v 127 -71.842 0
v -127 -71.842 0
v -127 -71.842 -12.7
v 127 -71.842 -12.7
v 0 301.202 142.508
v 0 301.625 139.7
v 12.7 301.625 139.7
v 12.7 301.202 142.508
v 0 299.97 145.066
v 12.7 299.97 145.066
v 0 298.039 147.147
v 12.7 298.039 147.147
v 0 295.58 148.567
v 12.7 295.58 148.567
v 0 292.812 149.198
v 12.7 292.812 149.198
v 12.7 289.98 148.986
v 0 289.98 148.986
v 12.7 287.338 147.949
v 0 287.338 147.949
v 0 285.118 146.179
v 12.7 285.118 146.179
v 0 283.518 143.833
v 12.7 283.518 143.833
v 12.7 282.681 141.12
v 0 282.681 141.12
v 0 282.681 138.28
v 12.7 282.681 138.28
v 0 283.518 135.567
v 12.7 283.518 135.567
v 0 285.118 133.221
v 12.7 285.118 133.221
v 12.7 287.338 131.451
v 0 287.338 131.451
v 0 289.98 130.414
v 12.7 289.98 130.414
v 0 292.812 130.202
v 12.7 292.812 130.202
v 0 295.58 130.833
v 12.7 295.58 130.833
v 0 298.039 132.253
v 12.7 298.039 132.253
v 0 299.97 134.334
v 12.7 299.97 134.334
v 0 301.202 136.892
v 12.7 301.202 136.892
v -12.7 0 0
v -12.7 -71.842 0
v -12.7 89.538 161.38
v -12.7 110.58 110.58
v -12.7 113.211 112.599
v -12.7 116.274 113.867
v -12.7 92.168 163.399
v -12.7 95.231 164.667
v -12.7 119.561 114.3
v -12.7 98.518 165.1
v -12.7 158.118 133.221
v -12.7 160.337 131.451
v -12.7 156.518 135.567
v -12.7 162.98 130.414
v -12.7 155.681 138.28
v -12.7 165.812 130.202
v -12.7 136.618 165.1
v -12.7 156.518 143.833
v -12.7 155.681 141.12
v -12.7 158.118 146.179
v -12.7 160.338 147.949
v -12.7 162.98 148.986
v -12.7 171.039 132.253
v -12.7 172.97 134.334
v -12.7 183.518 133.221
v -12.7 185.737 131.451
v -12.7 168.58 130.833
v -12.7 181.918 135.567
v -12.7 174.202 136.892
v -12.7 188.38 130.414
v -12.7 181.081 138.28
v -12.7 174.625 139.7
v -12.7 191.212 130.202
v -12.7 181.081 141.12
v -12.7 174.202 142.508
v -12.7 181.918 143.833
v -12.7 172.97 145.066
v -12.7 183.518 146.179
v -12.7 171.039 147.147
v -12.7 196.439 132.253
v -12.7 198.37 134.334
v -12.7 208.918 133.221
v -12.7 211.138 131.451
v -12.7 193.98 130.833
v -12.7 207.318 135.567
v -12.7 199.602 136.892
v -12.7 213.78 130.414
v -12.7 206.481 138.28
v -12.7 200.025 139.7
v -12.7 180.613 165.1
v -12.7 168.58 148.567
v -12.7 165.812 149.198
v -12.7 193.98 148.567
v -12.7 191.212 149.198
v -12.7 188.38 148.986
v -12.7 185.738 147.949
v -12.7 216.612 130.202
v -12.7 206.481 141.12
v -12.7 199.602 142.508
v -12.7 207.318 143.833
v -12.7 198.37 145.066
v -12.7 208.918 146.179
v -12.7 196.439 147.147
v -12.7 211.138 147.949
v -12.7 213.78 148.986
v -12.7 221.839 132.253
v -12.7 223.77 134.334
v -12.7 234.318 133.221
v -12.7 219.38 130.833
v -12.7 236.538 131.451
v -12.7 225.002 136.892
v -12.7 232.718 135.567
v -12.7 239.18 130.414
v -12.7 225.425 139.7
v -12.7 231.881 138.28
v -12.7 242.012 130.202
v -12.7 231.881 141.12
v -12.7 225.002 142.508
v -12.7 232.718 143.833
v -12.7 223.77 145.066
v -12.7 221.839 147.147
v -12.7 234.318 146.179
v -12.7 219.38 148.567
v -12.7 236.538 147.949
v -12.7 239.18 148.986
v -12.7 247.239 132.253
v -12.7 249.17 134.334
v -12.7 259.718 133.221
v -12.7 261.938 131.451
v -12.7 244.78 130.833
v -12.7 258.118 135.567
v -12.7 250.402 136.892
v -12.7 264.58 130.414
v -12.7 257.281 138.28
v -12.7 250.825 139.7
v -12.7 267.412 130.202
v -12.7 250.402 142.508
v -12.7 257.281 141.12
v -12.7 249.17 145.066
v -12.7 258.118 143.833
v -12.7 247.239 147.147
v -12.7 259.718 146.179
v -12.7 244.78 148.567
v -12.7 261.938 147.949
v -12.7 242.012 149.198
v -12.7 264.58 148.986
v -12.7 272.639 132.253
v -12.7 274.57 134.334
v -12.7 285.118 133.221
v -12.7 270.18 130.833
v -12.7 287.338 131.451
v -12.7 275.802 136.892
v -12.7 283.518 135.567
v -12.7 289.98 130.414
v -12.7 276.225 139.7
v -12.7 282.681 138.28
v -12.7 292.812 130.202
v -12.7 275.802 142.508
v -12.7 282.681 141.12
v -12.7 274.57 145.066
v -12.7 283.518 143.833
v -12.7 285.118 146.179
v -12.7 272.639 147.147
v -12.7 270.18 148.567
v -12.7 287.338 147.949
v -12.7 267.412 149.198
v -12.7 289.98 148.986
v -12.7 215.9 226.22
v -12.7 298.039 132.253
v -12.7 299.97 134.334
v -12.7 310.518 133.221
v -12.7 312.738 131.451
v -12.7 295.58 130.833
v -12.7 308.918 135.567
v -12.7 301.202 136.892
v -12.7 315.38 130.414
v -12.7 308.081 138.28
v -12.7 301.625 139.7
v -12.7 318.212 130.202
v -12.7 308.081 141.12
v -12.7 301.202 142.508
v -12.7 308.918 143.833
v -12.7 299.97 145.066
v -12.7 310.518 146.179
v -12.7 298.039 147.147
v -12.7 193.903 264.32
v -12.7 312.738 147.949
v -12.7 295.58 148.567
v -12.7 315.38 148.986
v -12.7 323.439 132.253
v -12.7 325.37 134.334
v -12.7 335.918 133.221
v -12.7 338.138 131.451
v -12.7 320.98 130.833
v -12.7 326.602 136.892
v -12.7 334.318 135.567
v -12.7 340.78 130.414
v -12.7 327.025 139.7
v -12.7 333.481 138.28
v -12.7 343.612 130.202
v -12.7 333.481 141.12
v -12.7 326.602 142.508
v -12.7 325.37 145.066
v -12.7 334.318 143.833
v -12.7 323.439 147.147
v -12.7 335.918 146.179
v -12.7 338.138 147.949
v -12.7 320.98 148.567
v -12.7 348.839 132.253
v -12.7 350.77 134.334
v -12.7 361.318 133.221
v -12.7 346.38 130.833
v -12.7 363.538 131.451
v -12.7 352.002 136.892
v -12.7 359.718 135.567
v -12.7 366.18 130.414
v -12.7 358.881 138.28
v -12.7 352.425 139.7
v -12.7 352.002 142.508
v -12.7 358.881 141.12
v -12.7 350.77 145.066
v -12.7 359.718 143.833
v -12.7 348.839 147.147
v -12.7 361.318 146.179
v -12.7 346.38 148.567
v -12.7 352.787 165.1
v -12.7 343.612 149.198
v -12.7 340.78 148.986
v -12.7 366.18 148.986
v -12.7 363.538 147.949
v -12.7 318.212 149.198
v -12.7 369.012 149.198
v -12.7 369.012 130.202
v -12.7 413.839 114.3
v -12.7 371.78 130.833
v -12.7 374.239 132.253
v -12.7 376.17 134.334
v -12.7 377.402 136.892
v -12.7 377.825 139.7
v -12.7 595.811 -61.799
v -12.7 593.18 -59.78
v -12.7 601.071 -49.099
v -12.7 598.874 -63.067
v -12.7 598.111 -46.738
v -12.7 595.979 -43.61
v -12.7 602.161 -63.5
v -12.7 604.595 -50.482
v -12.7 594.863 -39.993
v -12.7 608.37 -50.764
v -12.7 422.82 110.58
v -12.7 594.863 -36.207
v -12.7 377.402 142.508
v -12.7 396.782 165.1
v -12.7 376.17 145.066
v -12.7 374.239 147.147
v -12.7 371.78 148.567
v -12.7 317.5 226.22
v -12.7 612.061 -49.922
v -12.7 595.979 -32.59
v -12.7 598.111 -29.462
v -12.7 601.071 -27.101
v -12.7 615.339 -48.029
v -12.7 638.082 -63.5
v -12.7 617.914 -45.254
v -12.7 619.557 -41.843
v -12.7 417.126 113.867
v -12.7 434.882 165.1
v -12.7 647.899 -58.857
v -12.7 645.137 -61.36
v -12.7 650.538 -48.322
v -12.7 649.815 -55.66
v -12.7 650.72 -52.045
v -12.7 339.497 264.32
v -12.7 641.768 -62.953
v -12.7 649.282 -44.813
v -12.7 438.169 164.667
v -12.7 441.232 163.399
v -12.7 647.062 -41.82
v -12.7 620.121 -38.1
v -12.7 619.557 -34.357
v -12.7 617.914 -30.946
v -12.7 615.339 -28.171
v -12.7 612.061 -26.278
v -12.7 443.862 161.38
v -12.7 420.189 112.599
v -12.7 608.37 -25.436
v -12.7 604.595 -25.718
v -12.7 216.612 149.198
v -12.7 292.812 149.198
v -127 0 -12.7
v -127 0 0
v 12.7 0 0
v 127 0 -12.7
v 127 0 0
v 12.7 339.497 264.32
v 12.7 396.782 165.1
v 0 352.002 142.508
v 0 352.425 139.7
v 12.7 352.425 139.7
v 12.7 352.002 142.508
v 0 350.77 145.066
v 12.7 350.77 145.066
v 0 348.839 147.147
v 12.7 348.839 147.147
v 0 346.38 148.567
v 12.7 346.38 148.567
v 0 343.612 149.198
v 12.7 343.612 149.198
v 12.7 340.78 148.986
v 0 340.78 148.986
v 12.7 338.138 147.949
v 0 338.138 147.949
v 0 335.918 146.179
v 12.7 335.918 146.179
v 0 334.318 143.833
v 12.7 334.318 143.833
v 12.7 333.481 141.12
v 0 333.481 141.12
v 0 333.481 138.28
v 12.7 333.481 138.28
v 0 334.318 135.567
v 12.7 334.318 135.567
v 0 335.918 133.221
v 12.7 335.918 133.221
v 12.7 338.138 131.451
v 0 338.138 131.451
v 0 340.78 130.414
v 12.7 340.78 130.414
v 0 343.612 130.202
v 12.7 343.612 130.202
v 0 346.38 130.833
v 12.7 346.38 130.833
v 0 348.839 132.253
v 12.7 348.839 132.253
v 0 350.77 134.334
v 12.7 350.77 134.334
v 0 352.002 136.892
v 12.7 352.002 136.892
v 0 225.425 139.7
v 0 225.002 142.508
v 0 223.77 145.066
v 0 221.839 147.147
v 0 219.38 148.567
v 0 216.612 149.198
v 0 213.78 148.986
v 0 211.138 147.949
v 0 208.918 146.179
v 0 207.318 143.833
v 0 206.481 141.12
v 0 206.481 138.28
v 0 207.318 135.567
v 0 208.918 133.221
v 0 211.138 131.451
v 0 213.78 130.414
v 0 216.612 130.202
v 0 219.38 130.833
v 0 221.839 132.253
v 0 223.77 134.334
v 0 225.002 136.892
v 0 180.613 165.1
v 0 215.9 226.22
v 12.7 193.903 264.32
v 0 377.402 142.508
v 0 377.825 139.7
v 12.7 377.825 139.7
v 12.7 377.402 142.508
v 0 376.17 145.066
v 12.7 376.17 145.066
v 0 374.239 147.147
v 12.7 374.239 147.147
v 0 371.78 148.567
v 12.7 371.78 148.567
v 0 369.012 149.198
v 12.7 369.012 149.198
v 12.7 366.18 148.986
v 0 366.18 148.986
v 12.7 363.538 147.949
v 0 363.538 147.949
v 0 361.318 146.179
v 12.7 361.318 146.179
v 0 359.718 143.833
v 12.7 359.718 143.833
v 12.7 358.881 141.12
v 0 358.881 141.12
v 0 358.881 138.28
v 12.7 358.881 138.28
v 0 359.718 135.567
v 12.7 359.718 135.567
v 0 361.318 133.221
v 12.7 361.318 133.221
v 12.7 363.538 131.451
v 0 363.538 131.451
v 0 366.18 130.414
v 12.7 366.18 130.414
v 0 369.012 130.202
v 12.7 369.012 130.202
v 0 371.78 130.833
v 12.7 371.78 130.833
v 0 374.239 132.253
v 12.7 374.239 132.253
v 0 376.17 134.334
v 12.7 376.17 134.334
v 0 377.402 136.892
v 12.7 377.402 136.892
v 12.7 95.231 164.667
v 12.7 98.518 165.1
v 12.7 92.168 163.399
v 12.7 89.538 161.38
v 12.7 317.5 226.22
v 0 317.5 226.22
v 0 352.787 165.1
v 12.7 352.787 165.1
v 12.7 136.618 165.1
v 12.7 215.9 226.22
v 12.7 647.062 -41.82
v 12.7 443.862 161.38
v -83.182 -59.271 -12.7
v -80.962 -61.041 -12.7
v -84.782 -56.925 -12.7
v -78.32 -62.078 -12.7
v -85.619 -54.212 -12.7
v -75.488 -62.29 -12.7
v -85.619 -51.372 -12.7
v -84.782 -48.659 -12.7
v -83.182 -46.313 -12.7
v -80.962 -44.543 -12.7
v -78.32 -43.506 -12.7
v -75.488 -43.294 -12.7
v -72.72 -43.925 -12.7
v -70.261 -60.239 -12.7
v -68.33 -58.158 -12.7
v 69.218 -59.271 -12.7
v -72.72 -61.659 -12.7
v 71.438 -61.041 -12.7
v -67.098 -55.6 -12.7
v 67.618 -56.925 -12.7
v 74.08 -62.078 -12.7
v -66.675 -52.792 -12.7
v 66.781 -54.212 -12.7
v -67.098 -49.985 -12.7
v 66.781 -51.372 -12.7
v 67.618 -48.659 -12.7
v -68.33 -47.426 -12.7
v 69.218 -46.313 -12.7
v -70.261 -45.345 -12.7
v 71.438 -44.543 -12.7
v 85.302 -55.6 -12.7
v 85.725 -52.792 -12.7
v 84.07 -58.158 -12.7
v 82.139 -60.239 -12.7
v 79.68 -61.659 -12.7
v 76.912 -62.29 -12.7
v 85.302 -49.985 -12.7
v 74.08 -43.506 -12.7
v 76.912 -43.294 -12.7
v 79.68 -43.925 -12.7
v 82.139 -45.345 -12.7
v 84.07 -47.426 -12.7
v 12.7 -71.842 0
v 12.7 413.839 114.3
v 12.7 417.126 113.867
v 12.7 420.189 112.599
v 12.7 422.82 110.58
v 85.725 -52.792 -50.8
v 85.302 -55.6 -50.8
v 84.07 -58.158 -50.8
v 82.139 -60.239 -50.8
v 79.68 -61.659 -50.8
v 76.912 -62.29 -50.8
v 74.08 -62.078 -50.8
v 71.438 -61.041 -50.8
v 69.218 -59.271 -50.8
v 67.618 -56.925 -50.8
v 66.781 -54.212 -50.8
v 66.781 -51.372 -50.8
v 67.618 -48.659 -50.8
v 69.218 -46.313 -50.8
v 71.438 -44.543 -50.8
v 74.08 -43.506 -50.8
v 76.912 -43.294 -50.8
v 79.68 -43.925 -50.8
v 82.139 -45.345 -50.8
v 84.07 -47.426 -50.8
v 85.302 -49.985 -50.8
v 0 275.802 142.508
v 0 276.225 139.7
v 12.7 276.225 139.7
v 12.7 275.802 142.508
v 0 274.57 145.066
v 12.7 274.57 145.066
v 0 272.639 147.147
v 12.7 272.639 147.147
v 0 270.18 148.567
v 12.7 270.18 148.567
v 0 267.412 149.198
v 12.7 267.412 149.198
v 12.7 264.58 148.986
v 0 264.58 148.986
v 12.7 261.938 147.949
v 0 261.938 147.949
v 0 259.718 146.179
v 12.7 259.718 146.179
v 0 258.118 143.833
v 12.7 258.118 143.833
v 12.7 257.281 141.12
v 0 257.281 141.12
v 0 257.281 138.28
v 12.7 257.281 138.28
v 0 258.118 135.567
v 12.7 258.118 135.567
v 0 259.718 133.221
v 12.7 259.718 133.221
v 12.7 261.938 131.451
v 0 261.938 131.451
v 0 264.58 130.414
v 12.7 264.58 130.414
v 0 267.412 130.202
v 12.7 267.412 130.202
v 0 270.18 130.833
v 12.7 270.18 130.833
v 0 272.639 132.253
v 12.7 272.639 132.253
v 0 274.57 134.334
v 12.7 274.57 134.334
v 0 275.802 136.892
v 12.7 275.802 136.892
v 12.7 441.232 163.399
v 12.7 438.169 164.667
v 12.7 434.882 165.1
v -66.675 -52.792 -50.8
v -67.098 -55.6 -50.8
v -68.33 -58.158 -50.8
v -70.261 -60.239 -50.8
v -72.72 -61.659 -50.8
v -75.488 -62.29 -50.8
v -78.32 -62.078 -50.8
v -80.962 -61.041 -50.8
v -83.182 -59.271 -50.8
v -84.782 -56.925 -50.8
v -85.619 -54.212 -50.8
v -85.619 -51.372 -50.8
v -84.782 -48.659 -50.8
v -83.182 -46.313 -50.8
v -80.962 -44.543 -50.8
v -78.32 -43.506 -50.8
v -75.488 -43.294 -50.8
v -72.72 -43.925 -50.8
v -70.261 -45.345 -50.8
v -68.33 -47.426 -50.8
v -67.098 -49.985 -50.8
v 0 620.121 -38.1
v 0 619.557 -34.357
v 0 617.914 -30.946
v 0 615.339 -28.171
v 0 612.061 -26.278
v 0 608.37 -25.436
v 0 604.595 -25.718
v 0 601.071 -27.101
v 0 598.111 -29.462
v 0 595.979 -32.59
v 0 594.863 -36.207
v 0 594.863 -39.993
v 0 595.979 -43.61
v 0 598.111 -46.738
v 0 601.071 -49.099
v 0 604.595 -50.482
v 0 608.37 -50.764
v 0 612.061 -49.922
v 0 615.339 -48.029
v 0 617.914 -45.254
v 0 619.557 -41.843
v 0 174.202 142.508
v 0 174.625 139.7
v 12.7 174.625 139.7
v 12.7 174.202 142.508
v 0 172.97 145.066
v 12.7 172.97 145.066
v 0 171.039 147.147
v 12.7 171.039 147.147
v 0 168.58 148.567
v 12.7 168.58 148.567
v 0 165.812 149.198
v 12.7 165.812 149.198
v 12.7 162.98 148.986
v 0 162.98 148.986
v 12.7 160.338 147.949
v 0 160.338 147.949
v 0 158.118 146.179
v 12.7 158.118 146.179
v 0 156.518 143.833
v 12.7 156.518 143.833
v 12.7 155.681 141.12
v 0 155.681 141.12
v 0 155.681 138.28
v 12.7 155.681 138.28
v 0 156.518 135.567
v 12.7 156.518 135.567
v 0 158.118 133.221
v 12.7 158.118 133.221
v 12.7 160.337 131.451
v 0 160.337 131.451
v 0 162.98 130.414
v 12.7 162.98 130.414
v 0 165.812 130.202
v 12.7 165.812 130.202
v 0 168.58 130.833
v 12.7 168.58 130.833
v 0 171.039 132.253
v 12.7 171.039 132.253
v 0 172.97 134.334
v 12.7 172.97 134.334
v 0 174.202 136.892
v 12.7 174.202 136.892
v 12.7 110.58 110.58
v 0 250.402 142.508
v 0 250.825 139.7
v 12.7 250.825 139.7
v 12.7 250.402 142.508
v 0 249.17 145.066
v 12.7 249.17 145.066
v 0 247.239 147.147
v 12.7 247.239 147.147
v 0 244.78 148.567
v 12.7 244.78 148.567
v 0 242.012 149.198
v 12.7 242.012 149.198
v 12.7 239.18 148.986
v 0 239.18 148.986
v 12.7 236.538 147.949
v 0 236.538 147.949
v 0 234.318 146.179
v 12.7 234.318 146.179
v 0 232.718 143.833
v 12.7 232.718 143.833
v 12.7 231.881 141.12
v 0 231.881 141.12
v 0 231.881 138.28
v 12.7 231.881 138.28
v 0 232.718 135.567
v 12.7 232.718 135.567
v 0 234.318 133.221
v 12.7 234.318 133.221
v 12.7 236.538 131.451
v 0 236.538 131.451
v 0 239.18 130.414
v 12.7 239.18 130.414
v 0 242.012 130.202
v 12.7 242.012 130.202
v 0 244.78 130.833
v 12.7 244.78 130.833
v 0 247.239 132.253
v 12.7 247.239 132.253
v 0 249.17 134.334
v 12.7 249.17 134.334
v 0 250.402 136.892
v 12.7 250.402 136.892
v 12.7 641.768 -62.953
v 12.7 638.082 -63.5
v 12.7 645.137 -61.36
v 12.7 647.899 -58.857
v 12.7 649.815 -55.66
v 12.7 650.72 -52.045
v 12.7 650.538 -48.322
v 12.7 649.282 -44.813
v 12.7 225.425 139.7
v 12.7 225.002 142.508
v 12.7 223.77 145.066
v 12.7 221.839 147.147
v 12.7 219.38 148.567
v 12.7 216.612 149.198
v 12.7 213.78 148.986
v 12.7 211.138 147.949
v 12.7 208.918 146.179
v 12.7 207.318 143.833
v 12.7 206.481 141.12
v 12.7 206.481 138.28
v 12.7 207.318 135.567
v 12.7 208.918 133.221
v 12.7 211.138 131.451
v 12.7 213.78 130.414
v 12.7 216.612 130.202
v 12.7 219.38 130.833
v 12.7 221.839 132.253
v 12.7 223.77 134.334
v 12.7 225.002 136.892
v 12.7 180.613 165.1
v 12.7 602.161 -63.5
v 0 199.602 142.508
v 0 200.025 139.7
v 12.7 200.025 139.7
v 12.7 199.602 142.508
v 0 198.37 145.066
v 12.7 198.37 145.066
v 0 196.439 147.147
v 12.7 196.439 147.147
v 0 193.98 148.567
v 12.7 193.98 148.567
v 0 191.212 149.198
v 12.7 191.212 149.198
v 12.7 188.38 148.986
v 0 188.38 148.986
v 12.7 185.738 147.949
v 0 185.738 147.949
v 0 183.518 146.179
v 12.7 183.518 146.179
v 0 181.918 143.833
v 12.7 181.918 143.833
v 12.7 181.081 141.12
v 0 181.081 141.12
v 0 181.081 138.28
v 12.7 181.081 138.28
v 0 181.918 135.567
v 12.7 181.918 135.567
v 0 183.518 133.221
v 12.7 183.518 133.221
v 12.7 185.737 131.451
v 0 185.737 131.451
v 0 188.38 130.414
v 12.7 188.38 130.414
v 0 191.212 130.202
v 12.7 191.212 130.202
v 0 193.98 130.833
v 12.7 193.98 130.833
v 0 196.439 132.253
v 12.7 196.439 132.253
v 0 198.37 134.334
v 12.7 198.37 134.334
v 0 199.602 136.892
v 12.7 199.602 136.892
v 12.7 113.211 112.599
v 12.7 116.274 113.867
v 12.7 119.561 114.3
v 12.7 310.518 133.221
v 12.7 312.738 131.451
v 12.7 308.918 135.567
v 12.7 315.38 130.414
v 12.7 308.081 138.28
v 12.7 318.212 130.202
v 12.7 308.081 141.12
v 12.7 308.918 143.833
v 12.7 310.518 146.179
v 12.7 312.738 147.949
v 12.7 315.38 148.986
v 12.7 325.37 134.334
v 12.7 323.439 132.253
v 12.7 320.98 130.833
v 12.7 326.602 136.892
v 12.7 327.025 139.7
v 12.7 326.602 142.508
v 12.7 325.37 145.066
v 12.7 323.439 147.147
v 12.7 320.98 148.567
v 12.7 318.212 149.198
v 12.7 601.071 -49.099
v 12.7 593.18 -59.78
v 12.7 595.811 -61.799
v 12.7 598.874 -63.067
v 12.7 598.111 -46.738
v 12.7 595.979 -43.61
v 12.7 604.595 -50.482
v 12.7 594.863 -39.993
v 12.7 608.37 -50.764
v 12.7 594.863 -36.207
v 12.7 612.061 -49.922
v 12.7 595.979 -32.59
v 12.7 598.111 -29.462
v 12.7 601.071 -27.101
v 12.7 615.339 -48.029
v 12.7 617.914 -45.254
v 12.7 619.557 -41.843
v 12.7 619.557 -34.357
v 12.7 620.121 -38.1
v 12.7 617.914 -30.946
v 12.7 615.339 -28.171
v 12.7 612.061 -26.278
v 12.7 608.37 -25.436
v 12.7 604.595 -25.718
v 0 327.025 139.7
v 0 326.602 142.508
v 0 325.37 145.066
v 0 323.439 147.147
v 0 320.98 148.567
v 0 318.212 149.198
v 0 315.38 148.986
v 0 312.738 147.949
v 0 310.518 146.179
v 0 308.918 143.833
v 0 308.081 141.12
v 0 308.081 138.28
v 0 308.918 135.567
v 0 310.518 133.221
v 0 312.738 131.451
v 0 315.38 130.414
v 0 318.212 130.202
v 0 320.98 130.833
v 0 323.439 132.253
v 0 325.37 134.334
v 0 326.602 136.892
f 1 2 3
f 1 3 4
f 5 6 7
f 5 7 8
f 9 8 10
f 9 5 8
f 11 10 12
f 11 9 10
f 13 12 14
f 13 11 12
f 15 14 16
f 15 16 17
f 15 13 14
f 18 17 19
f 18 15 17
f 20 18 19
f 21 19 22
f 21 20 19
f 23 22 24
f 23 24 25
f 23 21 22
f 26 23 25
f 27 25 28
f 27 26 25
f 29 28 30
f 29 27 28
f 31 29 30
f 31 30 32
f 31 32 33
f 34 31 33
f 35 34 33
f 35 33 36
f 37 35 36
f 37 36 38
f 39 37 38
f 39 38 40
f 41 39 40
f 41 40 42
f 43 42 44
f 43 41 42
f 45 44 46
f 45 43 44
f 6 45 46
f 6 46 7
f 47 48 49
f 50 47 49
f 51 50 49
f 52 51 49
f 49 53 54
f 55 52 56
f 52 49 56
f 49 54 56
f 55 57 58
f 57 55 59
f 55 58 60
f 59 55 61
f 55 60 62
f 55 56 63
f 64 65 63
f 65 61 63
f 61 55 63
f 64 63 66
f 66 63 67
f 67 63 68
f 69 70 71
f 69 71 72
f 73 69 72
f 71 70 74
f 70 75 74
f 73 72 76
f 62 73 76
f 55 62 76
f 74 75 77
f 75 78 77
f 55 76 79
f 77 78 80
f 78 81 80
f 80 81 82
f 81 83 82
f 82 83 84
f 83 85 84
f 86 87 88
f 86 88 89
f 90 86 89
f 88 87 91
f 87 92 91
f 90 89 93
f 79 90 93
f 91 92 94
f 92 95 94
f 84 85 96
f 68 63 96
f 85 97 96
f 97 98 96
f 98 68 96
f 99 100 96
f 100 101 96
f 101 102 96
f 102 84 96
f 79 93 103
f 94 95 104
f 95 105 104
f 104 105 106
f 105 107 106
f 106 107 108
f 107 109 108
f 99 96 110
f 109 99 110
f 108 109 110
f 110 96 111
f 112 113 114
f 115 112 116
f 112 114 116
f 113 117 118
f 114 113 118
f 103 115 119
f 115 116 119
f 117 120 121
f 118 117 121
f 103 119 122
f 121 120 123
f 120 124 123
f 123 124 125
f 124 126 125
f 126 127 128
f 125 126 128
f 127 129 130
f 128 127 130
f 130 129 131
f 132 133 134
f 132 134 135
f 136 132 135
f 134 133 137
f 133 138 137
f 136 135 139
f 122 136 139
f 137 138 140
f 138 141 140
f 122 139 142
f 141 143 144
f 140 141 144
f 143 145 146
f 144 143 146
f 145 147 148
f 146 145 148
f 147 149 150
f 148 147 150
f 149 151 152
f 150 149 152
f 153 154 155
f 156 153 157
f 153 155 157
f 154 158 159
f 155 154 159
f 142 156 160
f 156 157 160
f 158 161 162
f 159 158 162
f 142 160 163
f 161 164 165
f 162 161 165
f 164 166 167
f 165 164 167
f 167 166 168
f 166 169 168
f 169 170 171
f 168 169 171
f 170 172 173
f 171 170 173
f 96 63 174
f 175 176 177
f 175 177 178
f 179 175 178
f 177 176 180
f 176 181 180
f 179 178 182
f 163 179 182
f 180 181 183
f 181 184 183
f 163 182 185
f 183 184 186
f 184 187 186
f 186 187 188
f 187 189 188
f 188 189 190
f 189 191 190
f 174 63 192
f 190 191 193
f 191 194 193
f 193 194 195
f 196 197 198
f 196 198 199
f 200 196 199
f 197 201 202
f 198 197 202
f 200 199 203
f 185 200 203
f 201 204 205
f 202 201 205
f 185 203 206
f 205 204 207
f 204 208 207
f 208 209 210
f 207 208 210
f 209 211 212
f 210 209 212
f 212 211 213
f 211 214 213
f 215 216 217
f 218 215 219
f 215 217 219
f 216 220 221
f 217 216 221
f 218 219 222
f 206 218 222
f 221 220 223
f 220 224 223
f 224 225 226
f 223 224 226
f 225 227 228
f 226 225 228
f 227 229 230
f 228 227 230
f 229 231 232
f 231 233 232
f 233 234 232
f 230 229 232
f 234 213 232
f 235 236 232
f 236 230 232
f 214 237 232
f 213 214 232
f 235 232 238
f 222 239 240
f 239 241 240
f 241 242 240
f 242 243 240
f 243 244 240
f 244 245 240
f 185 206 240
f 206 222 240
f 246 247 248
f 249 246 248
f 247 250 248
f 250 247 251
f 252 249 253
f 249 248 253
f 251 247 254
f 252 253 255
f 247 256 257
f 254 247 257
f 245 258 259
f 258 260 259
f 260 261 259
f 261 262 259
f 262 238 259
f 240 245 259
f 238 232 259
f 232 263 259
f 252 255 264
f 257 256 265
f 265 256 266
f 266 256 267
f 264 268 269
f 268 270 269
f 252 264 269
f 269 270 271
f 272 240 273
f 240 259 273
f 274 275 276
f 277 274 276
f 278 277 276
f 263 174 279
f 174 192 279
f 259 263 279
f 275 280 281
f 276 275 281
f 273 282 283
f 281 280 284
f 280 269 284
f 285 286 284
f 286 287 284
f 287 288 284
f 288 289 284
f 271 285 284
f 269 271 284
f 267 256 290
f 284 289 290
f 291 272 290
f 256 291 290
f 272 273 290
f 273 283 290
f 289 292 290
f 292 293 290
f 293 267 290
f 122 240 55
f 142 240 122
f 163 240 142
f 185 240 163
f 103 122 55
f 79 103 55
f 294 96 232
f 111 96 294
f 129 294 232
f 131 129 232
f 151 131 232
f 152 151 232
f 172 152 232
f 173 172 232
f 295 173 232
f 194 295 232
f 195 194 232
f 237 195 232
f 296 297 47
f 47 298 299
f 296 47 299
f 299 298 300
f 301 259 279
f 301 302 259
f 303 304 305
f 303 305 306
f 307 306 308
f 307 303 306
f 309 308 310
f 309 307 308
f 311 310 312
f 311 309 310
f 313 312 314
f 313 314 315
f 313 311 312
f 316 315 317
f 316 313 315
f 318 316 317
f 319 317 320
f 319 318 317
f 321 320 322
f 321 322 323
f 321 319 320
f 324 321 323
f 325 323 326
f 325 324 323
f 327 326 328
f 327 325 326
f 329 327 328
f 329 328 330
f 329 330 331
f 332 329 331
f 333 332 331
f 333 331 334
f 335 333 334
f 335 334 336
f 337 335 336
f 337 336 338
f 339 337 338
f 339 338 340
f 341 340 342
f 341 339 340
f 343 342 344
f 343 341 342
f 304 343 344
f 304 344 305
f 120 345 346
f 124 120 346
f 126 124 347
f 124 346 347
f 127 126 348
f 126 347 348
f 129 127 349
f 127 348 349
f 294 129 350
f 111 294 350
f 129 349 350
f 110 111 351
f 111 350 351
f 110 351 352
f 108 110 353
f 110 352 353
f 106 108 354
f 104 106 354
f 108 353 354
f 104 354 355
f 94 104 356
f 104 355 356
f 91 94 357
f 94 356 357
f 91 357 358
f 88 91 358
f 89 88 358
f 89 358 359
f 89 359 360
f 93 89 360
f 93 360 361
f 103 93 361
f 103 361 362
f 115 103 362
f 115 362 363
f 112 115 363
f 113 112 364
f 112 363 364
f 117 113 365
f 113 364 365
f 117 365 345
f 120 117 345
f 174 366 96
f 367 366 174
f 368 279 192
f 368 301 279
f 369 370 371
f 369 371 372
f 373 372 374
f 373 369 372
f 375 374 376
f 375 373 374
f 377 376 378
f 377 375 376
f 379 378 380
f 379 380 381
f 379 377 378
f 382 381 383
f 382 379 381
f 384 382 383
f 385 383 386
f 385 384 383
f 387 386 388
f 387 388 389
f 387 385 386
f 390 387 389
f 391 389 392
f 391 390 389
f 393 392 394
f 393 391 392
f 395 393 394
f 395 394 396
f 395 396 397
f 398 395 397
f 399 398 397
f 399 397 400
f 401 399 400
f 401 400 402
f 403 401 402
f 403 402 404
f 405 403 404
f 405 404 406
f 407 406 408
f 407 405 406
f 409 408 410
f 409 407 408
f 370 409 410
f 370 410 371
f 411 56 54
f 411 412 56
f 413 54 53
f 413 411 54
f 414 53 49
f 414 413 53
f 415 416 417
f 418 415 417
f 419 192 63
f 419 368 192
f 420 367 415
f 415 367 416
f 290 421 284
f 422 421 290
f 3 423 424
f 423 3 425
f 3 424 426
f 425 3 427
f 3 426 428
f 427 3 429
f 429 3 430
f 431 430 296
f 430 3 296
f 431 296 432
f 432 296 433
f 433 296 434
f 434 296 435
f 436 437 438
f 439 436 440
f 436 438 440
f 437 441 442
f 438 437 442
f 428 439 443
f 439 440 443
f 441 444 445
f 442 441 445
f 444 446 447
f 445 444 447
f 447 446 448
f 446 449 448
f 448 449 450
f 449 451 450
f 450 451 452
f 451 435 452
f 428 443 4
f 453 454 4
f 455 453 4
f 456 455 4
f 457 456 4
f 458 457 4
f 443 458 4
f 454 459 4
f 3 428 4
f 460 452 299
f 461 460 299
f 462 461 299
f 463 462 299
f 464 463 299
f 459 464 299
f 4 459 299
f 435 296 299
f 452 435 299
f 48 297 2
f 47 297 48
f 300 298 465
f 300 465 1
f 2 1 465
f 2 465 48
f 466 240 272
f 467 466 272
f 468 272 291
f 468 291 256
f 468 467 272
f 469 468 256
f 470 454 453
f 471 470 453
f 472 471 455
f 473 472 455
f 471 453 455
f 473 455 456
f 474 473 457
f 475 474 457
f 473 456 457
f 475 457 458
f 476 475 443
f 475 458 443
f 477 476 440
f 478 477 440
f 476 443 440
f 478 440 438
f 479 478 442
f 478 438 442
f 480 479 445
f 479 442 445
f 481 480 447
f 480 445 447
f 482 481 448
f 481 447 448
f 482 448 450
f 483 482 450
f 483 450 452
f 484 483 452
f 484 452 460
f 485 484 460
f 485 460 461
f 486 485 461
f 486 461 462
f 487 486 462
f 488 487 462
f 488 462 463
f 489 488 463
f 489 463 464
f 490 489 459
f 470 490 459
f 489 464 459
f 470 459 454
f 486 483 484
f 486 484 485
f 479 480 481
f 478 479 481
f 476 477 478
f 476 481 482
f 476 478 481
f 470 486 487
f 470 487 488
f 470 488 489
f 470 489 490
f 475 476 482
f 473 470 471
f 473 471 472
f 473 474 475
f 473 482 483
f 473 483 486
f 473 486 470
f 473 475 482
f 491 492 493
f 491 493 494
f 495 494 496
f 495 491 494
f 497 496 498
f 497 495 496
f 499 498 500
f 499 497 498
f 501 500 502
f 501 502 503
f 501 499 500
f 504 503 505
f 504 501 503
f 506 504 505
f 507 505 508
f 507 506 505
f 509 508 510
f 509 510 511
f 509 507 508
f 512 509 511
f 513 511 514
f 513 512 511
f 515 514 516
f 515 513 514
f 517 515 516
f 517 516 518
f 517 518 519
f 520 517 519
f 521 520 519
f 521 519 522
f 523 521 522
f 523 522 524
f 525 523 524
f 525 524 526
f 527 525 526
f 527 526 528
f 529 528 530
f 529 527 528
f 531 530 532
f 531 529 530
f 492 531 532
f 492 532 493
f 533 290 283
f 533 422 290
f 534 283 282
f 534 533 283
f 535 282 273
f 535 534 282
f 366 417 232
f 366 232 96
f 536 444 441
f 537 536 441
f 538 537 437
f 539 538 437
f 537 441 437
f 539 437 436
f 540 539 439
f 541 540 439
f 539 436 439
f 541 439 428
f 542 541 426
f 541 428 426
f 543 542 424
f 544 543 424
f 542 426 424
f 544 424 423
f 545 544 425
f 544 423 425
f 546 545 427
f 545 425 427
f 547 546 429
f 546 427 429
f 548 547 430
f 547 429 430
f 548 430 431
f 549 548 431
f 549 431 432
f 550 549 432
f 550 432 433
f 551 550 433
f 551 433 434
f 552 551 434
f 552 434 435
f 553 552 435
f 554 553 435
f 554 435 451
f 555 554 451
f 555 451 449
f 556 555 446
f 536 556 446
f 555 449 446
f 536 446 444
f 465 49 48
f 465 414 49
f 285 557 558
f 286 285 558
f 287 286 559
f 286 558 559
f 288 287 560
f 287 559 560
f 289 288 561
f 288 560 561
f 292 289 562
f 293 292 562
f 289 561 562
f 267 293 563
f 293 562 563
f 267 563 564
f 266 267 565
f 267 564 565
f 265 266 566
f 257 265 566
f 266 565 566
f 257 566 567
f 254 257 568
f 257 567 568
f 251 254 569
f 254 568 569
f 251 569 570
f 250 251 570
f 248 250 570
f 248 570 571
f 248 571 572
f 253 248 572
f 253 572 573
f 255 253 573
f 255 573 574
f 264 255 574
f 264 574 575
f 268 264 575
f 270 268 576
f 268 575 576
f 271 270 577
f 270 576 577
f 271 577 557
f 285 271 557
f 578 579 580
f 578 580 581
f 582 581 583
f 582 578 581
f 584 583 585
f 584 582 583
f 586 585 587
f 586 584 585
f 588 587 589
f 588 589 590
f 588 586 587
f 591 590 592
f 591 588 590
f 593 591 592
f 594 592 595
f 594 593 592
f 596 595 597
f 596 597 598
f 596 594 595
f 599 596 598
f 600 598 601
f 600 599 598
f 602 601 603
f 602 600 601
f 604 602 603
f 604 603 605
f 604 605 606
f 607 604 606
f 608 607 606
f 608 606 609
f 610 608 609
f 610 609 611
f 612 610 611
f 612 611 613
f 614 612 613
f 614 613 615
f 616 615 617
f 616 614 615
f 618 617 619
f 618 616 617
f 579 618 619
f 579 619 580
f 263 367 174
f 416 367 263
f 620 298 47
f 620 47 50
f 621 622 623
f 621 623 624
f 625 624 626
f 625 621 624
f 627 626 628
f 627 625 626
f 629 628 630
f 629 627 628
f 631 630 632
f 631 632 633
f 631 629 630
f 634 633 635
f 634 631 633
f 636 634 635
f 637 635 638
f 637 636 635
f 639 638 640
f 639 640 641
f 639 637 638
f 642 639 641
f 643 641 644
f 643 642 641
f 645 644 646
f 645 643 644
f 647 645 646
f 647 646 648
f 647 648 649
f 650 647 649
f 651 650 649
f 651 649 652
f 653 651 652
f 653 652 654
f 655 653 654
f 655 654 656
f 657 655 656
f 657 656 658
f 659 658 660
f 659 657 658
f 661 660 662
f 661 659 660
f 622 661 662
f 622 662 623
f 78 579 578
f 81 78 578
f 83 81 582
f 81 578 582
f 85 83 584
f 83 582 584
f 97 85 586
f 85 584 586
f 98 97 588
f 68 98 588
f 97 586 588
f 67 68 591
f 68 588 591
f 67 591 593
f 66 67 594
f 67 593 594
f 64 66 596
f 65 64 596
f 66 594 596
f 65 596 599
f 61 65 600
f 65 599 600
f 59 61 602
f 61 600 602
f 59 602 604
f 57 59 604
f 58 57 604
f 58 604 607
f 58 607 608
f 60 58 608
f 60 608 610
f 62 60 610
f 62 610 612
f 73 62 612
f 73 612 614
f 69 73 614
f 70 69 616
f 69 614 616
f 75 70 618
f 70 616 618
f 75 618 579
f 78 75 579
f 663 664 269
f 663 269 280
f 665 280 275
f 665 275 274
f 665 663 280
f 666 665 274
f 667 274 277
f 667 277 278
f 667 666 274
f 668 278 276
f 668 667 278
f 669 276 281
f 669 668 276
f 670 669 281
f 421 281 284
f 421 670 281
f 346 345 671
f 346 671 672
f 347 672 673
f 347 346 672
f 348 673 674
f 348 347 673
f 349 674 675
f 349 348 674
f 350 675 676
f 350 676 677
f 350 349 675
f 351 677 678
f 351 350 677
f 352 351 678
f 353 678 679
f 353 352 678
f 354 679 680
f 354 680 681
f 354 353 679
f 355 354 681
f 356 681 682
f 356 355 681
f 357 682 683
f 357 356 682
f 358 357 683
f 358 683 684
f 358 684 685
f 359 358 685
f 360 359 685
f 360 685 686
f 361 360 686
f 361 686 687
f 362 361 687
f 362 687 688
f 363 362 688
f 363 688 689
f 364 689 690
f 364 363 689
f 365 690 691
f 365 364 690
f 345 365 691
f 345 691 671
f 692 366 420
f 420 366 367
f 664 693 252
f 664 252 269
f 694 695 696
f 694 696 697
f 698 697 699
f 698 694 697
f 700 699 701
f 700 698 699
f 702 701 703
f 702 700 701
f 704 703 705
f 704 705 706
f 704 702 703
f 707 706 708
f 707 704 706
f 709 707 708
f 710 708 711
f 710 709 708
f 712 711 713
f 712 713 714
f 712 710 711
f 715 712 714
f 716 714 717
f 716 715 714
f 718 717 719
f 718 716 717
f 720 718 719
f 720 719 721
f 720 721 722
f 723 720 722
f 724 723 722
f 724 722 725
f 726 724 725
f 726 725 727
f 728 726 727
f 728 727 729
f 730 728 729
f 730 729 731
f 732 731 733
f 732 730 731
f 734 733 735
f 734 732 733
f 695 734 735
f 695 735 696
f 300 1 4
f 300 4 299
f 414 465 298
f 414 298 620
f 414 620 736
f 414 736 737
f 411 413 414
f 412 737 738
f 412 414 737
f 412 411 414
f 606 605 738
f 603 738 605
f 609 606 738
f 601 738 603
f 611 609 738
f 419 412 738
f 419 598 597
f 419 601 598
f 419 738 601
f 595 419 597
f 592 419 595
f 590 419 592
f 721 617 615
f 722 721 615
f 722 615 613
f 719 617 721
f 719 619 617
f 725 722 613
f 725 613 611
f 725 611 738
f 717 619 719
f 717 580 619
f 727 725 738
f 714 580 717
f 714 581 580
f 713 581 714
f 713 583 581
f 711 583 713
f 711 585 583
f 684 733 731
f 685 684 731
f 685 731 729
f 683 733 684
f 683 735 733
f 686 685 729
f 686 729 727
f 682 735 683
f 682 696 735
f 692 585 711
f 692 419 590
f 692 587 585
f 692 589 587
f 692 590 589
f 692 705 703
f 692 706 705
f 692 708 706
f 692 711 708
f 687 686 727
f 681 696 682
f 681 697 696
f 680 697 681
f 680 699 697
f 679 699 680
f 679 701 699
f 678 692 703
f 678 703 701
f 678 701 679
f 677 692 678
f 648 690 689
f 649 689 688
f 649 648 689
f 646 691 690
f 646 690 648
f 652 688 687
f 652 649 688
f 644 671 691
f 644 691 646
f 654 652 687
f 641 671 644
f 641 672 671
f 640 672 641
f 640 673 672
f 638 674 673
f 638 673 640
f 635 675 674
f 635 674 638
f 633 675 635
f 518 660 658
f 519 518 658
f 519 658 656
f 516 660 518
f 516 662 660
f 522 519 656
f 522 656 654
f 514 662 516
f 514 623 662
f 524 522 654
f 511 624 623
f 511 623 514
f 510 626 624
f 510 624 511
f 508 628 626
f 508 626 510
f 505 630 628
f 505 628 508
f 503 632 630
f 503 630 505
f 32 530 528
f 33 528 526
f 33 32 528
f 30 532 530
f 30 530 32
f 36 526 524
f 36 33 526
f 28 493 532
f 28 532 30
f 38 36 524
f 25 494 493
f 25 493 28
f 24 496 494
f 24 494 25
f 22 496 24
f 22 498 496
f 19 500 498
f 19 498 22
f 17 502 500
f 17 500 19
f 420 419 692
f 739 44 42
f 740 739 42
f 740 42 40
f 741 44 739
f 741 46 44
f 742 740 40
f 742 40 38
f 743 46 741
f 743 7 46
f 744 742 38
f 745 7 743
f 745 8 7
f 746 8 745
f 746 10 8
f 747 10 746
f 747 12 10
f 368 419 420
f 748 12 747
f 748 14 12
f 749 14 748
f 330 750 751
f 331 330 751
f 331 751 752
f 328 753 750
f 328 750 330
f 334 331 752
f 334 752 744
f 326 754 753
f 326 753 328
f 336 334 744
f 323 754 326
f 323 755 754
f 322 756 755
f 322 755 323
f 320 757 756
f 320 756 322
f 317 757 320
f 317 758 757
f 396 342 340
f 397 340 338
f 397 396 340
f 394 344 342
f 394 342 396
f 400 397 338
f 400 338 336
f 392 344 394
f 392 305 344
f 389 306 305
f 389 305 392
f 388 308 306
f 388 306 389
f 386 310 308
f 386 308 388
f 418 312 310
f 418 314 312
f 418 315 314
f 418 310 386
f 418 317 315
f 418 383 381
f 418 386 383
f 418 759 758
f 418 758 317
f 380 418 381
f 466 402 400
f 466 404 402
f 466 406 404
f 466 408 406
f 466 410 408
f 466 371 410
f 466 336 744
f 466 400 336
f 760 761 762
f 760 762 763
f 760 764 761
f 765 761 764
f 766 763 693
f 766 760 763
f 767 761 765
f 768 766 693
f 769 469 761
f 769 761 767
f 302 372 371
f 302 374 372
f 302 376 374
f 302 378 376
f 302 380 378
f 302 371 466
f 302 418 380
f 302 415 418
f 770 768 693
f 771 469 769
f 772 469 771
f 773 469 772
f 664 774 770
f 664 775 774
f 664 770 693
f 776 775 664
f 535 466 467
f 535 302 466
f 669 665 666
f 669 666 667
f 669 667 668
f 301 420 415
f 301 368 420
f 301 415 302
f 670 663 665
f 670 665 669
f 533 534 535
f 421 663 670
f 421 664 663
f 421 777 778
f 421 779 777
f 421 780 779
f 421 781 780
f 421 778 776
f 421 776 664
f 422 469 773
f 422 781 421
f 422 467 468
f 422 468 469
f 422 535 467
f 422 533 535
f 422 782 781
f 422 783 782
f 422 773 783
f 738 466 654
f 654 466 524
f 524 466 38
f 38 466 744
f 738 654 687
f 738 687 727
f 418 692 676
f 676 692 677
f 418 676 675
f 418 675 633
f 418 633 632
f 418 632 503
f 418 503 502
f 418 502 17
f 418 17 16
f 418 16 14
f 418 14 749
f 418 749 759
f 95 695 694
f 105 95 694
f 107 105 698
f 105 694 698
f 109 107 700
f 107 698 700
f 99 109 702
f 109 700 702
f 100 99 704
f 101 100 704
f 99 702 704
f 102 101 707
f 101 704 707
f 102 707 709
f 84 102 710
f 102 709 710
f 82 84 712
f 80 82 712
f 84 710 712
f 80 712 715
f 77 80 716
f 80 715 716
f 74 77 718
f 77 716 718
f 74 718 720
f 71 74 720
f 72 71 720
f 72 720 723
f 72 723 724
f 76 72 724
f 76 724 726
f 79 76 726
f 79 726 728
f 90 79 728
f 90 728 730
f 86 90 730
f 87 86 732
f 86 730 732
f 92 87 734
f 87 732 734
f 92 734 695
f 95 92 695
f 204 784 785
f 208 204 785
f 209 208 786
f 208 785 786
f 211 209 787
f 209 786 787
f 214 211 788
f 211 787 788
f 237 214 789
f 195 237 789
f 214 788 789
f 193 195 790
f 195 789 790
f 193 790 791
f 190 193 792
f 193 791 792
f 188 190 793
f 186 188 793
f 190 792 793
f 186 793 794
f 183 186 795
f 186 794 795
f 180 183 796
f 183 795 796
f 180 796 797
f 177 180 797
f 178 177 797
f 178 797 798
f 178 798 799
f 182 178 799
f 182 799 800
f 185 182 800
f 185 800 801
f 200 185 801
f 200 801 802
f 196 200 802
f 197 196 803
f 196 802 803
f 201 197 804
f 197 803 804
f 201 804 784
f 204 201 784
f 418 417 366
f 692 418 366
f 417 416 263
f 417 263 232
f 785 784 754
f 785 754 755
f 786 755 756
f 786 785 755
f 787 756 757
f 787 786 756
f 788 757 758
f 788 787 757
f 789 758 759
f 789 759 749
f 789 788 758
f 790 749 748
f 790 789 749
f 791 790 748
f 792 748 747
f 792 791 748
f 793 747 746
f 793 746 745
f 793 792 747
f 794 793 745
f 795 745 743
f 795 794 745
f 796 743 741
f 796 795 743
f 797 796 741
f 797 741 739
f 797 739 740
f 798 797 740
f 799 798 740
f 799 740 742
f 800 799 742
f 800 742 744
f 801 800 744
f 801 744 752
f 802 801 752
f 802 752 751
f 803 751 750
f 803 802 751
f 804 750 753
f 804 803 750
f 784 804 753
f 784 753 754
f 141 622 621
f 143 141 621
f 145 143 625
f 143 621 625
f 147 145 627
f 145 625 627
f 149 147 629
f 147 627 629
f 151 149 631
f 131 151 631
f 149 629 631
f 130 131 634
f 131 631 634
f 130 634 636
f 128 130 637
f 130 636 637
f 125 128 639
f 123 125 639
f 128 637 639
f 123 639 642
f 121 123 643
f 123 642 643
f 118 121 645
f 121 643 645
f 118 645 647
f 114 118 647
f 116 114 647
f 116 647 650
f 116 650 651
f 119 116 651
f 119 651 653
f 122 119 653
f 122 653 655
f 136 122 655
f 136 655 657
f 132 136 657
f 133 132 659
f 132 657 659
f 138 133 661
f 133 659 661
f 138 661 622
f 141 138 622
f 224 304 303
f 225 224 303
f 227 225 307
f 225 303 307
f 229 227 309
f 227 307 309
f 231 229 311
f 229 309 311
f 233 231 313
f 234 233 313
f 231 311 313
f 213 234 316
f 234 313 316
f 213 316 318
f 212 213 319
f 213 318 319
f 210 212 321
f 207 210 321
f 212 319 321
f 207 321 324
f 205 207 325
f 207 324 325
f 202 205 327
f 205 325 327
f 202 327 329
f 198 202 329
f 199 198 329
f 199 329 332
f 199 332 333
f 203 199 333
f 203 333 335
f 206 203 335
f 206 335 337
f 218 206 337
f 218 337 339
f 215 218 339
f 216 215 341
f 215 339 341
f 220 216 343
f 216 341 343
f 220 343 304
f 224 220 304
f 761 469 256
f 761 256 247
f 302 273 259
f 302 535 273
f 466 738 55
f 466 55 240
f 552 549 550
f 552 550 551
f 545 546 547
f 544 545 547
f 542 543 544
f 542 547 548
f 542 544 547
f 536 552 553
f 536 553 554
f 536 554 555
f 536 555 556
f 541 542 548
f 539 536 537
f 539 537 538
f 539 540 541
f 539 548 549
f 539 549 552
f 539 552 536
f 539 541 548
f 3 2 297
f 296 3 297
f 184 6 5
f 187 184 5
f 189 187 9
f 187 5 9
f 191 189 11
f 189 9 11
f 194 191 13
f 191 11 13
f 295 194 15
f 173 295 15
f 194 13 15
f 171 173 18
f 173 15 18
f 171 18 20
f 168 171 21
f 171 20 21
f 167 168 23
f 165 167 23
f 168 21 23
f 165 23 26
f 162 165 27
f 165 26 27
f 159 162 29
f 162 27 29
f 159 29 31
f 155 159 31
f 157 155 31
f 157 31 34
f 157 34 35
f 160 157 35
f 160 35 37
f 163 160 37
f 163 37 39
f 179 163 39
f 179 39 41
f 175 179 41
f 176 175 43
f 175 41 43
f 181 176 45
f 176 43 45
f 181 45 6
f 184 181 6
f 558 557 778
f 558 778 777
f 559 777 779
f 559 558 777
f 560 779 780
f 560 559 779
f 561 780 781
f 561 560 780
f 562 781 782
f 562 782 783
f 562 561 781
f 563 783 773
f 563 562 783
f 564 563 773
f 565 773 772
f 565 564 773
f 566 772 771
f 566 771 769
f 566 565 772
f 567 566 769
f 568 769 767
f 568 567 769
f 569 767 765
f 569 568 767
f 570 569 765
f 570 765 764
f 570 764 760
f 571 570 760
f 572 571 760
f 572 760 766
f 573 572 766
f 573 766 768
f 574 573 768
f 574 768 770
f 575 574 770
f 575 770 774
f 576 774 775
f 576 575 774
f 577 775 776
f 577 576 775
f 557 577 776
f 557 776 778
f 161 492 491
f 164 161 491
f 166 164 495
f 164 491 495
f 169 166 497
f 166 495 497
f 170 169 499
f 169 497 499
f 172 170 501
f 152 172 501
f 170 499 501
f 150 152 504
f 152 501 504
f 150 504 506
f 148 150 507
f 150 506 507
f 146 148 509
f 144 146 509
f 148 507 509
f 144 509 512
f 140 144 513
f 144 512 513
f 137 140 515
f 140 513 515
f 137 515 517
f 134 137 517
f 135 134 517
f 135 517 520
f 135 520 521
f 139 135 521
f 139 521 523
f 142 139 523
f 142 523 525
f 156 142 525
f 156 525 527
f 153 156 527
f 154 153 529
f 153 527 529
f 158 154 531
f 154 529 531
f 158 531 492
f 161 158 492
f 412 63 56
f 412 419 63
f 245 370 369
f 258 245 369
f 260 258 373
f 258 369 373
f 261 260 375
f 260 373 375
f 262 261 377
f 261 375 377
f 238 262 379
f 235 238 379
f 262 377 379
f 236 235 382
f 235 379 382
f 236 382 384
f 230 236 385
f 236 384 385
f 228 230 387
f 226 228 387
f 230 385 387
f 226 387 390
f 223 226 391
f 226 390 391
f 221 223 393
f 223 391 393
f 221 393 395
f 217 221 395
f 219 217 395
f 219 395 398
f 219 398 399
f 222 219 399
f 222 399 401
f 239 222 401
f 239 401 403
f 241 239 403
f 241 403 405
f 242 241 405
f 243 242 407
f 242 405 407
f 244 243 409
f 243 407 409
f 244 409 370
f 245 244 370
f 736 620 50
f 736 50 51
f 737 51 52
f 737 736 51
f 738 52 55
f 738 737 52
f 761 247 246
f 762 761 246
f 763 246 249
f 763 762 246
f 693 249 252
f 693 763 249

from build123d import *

# Parameters (mm, degrees)
F0_R          = 12.7
F0_R_2        = 9.525
F1_DEPTH      = 12.7
F1_DEPTH_BACK = 12.7
F2_W          = 254
F2_H          = 71.842049
F3_DEPTH      = 12.7
F4_R          = 9.525
F5_DEPTH      = 38.1


with BuildPart() as f1:
    # F0 (on Right) → F1 (new body, two sides)
    with BuildSketch(Plane.YZ) as f1_sk:
        with BuildLine():
            Line((-71.842049, 0), (0, 0))
            Line((0, 0), (110.580256, 110.580256))
            ThreePointArc((110.580256, 110.580256), (114.700433, 113.33327), (119.560512, 114.3))
            Line((119.560512, 114.3), (413.839488, 114.3))
            ThreePointArc((413.839488, 114.3), (418.699567, 113.33327), (422.819744, 110.580256))
            Line((422.819744, 110.580256), (593.180256, -59.780256))
            ThreePointArc((593.180256, -59.780256), (597.300433, -62.53327), (602.160512, -63.5))
            Line((602.160512, -63.5), (638.081537, -63.5))
            ThreePointArc((638.081537, -63.5), (649.814807, -55.66008), (647.061793, -41.819744))
            Line((647.061793, -41.819744), (443.861793, 161.380256))
            ThreePointArc((443.861793, 161.380256), (439.741616, 164.13327), (434.881537, 165.1))
            Line((434.881537, 165.1), (396.781537, 165.1))
            Line((396.781537, 165.1), (339.497045, 264.31965))
            Line((339.497045, 264.31965), (193.902955, 264.31965))
            Line((193.902955, 264.31965), (136.618463, 165.1))
            Line((136.618463, 165.1), (98.518463, 165.1))
            ThreePointArc((98.518463, 165.1), (93.658384, 164.13327), (89.538207, 161.380256))
            Line((89.538207, 161.380256), (-71.842049, 0))
        make_face()
        with Locations((607.421024, -38.1)):
            Circle(F0_R, mode=Mode.SUBTRACT)
        with Locations((165.1, 139.7)):
            Circle(F0_R_2, mode=Mode.SUBTRACT)
        with Locations((190.5, 139.7)):
            Circle(F0_R_2, mode=Mode.SUBTRACT)
        with Locations((215.9, 139.7)):
            Circle(F0_R_2, mode=Mode.SUBTRACT)
        with Locations((241.3, 139.7)):
            Circle(F0_R_2, mode=Mode.SUBTRACT)
        with Locations((266.7, 139.7)):
            Circle(F0_R_2, mode=Mode.SUBTRACT)
        Polygon((352.787446, 165.1), (180.612554, 165.1), (215.9, 226.21965), (317.5, 226.21965), align=None, mode=Mode.SUBTRACT)
        with Locations((292.1, 139.7)):
            Circle(F0_R_2, mode=Mode.SUBTRACT)
        with Locations((317.5, 139.7)):
            Circle(F0_R_2, mode=Mode.SUBTRACT)
        with Locations((342.9, 139.7)):
            Circle(F0_R_2, mode=Mode.SUBTRACT)
        with Locations((368.3, 139.7)):
            Circle(F0_R_2, mode=Mode.SUBTRACT)
    extrude(amount=F1_DEPTH)
    extrude(f1_sk.sketch, amount=-F1_DEPTH_BACK)

    # F2 (on Top) → F3 (join)
    with BuildSketch(Plane.XY):
        with Locations((0, -35.921025)):
            Rectangle(F2_W, F2_H)
    extrude(amount=-F3_DEPTH)

    # F4 (on face) → F5 (join)
    with BuildSketch(Plane(origin=(0, 0, -12.7), x_dir=(1, 0, 0), z_dir=(0, 0, -1))):
        with Locations((76.2, 52.792049)):
            Circle(F4_R)
        with Locations((-76.2, 52.792049)):
            Circle(F4_R)
    extrude(amount=F5_DEPTH)


solid = f1.part
